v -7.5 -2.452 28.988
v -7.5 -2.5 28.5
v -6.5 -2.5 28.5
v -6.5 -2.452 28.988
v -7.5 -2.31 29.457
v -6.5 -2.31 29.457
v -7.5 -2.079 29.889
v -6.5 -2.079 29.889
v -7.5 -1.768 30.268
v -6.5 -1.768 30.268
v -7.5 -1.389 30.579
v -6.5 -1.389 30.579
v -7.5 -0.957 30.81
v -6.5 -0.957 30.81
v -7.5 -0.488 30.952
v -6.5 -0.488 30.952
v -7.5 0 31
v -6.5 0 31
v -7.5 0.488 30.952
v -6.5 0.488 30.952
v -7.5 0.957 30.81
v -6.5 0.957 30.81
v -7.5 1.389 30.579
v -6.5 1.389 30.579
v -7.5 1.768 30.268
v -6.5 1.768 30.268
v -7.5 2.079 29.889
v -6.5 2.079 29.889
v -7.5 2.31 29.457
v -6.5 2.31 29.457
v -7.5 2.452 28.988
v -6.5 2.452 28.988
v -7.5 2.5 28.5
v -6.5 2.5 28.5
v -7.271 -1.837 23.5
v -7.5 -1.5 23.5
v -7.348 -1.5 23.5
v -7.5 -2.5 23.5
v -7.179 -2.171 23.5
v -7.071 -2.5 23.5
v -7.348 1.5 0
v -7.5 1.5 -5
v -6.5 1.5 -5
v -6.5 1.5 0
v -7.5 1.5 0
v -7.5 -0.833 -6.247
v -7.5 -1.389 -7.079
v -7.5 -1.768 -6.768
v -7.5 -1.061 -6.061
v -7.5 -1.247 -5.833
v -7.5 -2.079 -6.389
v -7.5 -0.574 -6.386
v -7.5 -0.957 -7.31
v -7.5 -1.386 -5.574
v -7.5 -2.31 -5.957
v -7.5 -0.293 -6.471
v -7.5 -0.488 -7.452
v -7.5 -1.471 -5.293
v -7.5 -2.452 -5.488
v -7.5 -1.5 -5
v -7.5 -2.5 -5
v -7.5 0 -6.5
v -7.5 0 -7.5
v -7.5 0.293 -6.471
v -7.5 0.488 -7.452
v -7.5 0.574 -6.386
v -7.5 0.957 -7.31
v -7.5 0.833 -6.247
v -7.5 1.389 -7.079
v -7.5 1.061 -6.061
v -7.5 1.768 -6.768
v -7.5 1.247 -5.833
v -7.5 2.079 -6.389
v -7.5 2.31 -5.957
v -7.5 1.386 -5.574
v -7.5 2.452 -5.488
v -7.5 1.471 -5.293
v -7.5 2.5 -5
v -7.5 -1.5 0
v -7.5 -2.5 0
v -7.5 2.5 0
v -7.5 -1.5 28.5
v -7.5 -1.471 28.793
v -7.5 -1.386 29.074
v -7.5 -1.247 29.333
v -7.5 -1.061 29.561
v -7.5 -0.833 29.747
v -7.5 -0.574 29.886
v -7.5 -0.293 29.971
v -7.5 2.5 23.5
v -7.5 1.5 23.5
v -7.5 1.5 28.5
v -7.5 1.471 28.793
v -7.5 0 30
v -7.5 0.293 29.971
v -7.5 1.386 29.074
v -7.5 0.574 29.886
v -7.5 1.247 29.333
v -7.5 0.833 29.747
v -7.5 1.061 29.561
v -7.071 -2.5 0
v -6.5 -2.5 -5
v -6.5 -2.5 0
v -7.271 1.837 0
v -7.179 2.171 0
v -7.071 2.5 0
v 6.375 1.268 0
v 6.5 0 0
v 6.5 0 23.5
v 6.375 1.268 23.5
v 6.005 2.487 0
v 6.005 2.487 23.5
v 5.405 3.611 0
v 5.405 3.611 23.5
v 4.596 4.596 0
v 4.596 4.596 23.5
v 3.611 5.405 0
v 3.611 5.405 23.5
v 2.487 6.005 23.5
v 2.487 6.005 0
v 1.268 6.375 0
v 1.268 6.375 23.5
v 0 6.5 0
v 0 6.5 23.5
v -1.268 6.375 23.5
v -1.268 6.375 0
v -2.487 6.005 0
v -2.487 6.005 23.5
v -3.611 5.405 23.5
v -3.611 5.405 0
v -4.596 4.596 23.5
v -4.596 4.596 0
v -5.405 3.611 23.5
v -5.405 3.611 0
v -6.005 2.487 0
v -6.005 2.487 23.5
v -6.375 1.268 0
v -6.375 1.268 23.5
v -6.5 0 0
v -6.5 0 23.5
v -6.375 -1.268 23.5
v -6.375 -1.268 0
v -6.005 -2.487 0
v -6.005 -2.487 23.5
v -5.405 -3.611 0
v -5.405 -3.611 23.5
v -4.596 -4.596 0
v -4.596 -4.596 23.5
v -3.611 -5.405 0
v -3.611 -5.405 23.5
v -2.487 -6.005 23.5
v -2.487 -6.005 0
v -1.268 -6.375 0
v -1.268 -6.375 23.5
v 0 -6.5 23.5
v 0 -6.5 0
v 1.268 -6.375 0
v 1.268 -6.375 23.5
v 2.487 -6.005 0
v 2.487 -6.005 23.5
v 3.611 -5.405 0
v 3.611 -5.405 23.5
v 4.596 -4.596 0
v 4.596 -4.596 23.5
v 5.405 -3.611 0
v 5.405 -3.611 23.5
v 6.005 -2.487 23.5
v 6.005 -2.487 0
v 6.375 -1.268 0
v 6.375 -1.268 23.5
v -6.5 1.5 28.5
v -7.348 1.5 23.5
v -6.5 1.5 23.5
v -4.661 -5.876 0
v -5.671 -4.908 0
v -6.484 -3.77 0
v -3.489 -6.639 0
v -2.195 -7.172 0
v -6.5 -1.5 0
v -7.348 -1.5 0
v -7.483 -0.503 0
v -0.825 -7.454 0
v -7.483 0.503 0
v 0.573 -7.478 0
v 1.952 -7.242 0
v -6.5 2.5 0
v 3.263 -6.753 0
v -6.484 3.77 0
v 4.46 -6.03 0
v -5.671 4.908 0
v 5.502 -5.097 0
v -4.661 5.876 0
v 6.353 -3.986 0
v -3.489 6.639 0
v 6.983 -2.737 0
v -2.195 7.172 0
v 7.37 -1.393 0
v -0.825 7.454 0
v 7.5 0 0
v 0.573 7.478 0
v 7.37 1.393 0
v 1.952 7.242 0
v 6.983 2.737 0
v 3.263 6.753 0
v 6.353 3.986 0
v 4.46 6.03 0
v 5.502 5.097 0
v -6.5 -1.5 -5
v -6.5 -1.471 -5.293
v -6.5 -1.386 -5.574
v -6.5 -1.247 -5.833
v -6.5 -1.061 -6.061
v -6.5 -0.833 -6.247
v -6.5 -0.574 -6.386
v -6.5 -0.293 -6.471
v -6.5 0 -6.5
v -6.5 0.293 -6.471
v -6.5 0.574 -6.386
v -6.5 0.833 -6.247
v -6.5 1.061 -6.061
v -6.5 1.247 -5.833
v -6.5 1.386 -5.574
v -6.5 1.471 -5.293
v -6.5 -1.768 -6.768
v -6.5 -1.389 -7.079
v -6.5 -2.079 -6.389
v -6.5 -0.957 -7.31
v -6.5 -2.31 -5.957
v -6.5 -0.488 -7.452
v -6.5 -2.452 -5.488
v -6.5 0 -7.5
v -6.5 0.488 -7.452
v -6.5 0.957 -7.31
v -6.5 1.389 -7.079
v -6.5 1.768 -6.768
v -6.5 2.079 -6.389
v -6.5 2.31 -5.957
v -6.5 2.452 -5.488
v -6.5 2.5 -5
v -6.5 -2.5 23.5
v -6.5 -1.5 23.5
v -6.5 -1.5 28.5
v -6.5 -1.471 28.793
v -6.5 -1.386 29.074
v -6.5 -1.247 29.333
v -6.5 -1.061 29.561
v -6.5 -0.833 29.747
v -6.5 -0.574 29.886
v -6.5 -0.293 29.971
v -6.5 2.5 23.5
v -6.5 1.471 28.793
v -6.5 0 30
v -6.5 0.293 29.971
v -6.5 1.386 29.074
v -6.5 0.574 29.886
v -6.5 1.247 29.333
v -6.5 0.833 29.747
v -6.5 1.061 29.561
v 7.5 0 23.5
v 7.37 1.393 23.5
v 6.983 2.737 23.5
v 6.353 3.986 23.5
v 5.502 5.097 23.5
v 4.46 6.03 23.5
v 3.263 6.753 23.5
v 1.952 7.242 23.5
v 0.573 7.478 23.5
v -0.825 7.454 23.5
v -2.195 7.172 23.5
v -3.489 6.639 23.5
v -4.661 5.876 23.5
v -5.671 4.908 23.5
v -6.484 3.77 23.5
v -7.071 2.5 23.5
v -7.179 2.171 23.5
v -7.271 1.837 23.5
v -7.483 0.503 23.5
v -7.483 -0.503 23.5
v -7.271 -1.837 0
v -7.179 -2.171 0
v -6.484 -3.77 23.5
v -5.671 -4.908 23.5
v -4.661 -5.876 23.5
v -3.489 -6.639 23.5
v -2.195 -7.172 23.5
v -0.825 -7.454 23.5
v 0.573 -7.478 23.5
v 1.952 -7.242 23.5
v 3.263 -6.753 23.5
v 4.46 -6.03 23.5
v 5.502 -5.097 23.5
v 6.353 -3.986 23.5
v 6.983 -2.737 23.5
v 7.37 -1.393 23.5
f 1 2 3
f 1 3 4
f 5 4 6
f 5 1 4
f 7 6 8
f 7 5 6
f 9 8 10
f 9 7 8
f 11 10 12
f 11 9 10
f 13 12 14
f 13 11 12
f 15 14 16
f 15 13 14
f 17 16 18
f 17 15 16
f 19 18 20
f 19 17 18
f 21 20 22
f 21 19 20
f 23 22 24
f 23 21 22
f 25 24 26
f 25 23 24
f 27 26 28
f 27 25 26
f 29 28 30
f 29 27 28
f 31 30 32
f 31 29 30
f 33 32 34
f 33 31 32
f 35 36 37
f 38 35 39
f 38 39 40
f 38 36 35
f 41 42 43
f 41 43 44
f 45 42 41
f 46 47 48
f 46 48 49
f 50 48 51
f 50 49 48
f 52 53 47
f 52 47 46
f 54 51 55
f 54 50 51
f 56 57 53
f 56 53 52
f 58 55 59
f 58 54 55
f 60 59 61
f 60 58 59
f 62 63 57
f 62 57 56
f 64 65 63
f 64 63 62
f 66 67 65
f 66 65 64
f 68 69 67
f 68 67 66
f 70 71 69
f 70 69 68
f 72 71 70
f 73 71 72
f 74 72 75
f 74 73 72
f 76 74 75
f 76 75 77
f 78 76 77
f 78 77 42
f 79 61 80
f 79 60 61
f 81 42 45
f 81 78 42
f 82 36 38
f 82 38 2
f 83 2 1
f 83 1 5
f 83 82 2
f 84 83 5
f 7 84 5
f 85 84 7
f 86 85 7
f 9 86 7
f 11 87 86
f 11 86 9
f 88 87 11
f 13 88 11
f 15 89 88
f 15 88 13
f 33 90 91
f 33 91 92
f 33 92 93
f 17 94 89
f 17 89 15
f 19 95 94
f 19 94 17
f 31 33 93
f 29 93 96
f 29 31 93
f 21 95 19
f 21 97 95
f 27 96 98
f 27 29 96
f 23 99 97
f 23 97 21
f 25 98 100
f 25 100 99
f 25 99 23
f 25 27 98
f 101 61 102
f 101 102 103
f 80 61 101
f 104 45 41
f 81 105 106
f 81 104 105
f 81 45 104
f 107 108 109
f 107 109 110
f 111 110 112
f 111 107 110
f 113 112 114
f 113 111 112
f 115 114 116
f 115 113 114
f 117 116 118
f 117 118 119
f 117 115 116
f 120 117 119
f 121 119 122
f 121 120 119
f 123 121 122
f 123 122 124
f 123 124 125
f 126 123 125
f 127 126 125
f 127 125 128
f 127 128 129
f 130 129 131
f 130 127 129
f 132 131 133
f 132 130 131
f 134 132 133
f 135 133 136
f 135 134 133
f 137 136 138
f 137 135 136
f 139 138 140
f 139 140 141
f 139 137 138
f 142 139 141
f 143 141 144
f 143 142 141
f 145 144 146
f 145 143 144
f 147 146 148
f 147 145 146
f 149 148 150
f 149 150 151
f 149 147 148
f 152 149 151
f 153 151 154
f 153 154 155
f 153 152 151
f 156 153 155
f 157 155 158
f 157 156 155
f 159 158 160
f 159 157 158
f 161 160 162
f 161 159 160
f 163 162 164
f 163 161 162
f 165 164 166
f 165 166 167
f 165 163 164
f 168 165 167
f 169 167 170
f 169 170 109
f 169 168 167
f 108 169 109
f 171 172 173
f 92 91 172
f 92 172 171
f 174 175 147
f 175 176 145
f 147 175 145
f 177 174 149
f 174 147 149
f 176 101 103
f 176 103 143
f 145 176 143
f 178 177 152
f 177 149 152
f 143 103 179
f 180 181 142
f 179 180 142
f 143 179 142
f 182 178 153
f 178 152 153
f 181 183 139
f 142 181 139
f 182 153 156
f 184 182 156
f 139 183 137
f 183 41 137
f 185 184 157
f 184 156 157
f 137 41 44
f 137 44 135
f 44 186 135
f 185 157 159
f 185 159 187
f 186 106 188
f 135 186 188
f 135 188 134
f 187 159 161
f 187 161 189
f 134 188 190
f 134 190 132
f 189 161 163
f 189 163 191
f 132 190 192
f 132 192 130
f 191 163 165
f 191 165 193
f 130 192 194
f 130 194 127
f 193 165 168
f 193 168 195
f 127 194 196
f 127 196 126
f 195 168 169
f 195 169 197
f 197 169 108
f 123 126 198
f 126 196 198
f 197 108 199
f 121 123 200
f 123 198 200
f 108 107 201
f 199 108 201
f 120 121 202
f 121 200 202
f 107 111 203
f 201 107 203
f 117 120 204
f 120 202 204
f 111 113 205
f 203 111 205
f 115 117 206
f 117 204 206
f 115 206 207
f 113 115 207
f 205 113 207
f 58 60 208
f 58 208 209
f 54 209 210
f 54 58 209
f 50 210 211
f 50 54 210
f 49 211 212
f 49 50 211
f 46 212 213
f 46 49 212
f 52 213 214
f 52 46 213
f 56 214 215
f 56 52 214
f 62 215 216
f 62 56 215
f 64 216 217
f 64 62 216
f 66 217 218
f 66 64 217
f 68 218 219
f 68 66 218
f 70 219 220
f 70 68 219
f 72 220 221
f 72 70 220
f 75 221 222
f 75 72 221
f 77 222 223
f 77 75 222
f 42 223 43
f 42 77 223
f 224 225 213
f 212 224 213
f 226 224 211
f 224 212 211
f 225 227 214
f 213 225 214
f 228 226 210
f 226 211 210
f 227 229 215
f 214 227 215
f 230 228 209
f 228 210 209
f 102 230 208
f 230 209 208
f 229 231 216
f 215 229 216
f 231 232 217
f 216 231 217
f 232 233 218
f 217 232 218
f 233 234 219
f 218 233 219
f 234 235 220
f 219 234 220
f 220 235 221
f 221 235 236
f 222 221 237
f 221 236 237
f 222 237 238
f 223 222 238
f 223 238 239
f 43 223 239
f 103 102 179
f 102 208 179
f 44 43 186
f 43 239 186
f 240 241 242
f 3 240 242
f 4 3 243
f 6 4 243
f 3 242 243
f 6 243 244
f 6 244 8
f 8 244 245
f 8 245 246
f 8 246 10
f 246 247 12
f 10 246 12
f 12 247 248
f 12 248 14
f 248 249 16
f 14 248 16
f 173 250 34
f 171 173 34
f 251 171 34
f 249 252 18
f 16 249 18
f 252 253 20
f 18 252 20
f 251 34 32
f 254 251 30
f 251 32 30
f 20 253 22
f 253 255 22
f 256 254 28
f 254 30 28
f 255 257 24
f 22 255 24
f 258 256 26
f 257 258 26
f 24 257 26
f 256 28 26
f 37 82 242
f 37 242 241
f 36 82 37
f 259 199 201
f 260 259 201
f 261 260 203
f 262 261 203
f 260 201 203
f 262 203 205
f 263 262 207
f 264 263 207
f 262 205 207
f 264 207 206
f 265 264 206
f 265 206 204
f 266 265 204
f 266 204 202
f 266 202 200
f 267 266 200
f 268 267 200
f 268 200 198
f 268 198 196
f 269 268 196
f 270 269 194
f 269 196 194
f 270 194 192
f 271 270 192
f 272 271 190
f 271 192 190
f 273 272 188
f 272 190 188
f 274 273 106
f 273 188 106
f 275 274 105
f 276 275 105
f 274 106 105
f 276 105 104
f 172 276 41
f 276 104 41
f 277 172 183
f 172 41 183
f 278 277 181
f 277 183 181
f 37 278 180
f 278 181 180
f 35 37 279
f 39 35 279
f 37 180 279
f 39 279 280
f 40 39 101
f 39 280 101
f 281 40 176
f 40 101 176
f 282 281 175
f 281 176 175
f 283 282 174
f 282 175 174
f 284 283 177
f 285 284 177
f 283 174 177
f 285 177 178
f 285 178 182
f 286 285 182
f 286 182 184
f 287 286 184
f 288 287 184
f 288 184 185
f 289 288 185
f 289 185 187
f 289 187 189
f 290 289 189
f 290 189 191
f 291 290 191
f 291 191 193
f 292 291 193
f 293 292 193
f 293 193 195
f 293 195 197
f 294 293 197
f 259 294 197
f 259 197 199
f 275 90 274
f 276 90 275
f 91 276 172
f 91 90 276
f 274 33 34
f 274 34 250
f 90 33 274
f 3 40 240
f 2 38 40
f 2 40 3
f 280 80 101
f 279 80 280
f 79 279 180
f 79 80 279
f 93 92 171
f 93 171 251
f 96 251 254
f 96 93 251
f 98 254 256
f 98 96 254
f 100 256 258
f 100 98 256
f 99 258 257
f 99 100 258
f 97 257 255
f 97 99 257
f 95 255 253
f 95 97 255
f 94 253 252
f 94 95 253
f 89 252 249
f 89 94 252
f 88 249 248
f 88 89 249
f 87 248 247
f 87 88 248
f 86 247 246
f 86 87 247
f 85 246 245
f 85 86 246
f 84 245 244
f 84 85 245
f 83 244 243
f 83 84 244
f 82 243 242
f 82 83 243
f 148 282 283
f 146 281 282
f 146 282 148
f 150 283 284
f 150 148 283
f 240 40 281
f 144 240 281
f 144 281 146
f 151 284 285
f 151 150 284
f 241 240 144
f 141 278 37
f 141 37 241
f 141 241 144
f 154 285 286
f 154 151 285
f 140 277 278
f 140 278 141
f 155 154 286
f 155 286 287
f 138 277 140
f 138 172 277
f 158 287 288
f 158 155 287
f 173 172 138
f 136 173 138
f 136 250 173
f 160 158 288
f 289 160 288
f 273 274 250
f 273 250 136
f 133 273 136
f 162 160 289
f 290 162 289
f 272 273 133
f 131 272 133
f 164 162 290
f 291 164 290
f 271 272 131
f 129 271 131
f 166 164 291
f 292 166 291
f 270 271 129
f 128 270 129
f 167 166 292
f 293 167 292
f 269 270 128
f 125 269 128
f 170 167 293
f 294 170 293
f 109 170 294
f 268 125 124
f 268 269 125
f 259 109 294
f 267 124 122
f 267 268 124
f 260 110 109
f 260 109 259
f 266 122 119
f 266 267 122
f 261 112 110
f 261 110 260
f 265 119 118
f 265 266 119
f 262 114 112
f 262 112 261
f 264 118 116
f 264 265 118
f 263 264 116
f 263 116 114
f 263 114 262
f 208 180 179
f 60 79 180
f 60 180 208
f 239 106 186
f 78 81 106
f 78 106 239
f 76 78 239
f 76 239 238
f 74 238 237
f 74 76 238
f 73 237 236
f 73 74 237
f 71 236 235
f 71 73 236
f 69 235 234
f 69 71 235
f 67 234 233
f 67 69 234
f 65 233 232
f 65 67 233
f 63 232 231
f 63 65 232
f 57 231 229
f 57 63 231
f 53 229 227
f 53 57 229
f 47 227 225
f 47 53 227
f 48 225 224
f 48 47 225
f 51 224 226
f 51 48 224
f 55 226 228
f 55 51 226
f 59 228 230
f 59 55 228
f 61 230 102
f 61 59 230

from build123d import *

# Parameters (mm, degrees)
ESBO_O2_R                = 7.5
ESBO_O2_R_2              = 6.5
RESSALTO_EXTRUS_O1_DEPTH = 23.5
RESSALTO_EXTRUS_O2_DEPTH = 1


with BuildPart() as part:
    # Esboço2 → Ressalto-extrusão1 (new body)
    with BuildSketch(Plane.XY):
        Circle(ESBO_O2_R)
        Circle(ESBO_O2_R_2, mode=Mode.SUBTRACT)
    extrude(amount=RESSALTO_EXTRUS_O1_DEPTH)

    # Esboço3 → Ressalto-extrusão2 (add)
    with BuildSketch(Plane(origin=(-7.5, 0, 0), x_dir=(0, 0, -1), z_dir=(1, 0, 0))):
        with BuildLine():
            Line((5, 1.5), (0, 1.5))
            Line((0, 1.5), (0, 2.5))
            Line((0, 2.5), (5, 2.5))
            ThreePointArc((5, 2.5), (7.5, 0), (5, -2.5))
            Line((5, -2.5), (0, -2.5))
            Line((0, -2.5), (0, -1.5))
            Line((0, -1.5), (5, -1.5))
            ThreePointArc((5, -1.5), (6.5, 0), (5, 1.5))
        make_face()
        with BuildLine():
            Line((-28.5, 2.5), (-23.5, 2.5))
            Line((-23.5, 2.5), (-23.5, 1.5))
            Line((-23.5, 1.5), (-28.5, 1.5))
            ThreePointArc((-28.5, 1.5), (-30, 0), (-28.5, -1.5))
            Line((-28.5, -1.5), (-23.5, -1.5))
            Line((-23.5, -1.5), (-23.5, -2.5))
            Line((-23.5, -2.5), (-28.5, -2.5))
            ThreePointArc((-28.5, -2.5), (-31, 0), (-28.5, 2.5))
        make_face()
    extrude(amount=RESSALTO_EXTRUS_O2_DEPTH)


solid = part.part
